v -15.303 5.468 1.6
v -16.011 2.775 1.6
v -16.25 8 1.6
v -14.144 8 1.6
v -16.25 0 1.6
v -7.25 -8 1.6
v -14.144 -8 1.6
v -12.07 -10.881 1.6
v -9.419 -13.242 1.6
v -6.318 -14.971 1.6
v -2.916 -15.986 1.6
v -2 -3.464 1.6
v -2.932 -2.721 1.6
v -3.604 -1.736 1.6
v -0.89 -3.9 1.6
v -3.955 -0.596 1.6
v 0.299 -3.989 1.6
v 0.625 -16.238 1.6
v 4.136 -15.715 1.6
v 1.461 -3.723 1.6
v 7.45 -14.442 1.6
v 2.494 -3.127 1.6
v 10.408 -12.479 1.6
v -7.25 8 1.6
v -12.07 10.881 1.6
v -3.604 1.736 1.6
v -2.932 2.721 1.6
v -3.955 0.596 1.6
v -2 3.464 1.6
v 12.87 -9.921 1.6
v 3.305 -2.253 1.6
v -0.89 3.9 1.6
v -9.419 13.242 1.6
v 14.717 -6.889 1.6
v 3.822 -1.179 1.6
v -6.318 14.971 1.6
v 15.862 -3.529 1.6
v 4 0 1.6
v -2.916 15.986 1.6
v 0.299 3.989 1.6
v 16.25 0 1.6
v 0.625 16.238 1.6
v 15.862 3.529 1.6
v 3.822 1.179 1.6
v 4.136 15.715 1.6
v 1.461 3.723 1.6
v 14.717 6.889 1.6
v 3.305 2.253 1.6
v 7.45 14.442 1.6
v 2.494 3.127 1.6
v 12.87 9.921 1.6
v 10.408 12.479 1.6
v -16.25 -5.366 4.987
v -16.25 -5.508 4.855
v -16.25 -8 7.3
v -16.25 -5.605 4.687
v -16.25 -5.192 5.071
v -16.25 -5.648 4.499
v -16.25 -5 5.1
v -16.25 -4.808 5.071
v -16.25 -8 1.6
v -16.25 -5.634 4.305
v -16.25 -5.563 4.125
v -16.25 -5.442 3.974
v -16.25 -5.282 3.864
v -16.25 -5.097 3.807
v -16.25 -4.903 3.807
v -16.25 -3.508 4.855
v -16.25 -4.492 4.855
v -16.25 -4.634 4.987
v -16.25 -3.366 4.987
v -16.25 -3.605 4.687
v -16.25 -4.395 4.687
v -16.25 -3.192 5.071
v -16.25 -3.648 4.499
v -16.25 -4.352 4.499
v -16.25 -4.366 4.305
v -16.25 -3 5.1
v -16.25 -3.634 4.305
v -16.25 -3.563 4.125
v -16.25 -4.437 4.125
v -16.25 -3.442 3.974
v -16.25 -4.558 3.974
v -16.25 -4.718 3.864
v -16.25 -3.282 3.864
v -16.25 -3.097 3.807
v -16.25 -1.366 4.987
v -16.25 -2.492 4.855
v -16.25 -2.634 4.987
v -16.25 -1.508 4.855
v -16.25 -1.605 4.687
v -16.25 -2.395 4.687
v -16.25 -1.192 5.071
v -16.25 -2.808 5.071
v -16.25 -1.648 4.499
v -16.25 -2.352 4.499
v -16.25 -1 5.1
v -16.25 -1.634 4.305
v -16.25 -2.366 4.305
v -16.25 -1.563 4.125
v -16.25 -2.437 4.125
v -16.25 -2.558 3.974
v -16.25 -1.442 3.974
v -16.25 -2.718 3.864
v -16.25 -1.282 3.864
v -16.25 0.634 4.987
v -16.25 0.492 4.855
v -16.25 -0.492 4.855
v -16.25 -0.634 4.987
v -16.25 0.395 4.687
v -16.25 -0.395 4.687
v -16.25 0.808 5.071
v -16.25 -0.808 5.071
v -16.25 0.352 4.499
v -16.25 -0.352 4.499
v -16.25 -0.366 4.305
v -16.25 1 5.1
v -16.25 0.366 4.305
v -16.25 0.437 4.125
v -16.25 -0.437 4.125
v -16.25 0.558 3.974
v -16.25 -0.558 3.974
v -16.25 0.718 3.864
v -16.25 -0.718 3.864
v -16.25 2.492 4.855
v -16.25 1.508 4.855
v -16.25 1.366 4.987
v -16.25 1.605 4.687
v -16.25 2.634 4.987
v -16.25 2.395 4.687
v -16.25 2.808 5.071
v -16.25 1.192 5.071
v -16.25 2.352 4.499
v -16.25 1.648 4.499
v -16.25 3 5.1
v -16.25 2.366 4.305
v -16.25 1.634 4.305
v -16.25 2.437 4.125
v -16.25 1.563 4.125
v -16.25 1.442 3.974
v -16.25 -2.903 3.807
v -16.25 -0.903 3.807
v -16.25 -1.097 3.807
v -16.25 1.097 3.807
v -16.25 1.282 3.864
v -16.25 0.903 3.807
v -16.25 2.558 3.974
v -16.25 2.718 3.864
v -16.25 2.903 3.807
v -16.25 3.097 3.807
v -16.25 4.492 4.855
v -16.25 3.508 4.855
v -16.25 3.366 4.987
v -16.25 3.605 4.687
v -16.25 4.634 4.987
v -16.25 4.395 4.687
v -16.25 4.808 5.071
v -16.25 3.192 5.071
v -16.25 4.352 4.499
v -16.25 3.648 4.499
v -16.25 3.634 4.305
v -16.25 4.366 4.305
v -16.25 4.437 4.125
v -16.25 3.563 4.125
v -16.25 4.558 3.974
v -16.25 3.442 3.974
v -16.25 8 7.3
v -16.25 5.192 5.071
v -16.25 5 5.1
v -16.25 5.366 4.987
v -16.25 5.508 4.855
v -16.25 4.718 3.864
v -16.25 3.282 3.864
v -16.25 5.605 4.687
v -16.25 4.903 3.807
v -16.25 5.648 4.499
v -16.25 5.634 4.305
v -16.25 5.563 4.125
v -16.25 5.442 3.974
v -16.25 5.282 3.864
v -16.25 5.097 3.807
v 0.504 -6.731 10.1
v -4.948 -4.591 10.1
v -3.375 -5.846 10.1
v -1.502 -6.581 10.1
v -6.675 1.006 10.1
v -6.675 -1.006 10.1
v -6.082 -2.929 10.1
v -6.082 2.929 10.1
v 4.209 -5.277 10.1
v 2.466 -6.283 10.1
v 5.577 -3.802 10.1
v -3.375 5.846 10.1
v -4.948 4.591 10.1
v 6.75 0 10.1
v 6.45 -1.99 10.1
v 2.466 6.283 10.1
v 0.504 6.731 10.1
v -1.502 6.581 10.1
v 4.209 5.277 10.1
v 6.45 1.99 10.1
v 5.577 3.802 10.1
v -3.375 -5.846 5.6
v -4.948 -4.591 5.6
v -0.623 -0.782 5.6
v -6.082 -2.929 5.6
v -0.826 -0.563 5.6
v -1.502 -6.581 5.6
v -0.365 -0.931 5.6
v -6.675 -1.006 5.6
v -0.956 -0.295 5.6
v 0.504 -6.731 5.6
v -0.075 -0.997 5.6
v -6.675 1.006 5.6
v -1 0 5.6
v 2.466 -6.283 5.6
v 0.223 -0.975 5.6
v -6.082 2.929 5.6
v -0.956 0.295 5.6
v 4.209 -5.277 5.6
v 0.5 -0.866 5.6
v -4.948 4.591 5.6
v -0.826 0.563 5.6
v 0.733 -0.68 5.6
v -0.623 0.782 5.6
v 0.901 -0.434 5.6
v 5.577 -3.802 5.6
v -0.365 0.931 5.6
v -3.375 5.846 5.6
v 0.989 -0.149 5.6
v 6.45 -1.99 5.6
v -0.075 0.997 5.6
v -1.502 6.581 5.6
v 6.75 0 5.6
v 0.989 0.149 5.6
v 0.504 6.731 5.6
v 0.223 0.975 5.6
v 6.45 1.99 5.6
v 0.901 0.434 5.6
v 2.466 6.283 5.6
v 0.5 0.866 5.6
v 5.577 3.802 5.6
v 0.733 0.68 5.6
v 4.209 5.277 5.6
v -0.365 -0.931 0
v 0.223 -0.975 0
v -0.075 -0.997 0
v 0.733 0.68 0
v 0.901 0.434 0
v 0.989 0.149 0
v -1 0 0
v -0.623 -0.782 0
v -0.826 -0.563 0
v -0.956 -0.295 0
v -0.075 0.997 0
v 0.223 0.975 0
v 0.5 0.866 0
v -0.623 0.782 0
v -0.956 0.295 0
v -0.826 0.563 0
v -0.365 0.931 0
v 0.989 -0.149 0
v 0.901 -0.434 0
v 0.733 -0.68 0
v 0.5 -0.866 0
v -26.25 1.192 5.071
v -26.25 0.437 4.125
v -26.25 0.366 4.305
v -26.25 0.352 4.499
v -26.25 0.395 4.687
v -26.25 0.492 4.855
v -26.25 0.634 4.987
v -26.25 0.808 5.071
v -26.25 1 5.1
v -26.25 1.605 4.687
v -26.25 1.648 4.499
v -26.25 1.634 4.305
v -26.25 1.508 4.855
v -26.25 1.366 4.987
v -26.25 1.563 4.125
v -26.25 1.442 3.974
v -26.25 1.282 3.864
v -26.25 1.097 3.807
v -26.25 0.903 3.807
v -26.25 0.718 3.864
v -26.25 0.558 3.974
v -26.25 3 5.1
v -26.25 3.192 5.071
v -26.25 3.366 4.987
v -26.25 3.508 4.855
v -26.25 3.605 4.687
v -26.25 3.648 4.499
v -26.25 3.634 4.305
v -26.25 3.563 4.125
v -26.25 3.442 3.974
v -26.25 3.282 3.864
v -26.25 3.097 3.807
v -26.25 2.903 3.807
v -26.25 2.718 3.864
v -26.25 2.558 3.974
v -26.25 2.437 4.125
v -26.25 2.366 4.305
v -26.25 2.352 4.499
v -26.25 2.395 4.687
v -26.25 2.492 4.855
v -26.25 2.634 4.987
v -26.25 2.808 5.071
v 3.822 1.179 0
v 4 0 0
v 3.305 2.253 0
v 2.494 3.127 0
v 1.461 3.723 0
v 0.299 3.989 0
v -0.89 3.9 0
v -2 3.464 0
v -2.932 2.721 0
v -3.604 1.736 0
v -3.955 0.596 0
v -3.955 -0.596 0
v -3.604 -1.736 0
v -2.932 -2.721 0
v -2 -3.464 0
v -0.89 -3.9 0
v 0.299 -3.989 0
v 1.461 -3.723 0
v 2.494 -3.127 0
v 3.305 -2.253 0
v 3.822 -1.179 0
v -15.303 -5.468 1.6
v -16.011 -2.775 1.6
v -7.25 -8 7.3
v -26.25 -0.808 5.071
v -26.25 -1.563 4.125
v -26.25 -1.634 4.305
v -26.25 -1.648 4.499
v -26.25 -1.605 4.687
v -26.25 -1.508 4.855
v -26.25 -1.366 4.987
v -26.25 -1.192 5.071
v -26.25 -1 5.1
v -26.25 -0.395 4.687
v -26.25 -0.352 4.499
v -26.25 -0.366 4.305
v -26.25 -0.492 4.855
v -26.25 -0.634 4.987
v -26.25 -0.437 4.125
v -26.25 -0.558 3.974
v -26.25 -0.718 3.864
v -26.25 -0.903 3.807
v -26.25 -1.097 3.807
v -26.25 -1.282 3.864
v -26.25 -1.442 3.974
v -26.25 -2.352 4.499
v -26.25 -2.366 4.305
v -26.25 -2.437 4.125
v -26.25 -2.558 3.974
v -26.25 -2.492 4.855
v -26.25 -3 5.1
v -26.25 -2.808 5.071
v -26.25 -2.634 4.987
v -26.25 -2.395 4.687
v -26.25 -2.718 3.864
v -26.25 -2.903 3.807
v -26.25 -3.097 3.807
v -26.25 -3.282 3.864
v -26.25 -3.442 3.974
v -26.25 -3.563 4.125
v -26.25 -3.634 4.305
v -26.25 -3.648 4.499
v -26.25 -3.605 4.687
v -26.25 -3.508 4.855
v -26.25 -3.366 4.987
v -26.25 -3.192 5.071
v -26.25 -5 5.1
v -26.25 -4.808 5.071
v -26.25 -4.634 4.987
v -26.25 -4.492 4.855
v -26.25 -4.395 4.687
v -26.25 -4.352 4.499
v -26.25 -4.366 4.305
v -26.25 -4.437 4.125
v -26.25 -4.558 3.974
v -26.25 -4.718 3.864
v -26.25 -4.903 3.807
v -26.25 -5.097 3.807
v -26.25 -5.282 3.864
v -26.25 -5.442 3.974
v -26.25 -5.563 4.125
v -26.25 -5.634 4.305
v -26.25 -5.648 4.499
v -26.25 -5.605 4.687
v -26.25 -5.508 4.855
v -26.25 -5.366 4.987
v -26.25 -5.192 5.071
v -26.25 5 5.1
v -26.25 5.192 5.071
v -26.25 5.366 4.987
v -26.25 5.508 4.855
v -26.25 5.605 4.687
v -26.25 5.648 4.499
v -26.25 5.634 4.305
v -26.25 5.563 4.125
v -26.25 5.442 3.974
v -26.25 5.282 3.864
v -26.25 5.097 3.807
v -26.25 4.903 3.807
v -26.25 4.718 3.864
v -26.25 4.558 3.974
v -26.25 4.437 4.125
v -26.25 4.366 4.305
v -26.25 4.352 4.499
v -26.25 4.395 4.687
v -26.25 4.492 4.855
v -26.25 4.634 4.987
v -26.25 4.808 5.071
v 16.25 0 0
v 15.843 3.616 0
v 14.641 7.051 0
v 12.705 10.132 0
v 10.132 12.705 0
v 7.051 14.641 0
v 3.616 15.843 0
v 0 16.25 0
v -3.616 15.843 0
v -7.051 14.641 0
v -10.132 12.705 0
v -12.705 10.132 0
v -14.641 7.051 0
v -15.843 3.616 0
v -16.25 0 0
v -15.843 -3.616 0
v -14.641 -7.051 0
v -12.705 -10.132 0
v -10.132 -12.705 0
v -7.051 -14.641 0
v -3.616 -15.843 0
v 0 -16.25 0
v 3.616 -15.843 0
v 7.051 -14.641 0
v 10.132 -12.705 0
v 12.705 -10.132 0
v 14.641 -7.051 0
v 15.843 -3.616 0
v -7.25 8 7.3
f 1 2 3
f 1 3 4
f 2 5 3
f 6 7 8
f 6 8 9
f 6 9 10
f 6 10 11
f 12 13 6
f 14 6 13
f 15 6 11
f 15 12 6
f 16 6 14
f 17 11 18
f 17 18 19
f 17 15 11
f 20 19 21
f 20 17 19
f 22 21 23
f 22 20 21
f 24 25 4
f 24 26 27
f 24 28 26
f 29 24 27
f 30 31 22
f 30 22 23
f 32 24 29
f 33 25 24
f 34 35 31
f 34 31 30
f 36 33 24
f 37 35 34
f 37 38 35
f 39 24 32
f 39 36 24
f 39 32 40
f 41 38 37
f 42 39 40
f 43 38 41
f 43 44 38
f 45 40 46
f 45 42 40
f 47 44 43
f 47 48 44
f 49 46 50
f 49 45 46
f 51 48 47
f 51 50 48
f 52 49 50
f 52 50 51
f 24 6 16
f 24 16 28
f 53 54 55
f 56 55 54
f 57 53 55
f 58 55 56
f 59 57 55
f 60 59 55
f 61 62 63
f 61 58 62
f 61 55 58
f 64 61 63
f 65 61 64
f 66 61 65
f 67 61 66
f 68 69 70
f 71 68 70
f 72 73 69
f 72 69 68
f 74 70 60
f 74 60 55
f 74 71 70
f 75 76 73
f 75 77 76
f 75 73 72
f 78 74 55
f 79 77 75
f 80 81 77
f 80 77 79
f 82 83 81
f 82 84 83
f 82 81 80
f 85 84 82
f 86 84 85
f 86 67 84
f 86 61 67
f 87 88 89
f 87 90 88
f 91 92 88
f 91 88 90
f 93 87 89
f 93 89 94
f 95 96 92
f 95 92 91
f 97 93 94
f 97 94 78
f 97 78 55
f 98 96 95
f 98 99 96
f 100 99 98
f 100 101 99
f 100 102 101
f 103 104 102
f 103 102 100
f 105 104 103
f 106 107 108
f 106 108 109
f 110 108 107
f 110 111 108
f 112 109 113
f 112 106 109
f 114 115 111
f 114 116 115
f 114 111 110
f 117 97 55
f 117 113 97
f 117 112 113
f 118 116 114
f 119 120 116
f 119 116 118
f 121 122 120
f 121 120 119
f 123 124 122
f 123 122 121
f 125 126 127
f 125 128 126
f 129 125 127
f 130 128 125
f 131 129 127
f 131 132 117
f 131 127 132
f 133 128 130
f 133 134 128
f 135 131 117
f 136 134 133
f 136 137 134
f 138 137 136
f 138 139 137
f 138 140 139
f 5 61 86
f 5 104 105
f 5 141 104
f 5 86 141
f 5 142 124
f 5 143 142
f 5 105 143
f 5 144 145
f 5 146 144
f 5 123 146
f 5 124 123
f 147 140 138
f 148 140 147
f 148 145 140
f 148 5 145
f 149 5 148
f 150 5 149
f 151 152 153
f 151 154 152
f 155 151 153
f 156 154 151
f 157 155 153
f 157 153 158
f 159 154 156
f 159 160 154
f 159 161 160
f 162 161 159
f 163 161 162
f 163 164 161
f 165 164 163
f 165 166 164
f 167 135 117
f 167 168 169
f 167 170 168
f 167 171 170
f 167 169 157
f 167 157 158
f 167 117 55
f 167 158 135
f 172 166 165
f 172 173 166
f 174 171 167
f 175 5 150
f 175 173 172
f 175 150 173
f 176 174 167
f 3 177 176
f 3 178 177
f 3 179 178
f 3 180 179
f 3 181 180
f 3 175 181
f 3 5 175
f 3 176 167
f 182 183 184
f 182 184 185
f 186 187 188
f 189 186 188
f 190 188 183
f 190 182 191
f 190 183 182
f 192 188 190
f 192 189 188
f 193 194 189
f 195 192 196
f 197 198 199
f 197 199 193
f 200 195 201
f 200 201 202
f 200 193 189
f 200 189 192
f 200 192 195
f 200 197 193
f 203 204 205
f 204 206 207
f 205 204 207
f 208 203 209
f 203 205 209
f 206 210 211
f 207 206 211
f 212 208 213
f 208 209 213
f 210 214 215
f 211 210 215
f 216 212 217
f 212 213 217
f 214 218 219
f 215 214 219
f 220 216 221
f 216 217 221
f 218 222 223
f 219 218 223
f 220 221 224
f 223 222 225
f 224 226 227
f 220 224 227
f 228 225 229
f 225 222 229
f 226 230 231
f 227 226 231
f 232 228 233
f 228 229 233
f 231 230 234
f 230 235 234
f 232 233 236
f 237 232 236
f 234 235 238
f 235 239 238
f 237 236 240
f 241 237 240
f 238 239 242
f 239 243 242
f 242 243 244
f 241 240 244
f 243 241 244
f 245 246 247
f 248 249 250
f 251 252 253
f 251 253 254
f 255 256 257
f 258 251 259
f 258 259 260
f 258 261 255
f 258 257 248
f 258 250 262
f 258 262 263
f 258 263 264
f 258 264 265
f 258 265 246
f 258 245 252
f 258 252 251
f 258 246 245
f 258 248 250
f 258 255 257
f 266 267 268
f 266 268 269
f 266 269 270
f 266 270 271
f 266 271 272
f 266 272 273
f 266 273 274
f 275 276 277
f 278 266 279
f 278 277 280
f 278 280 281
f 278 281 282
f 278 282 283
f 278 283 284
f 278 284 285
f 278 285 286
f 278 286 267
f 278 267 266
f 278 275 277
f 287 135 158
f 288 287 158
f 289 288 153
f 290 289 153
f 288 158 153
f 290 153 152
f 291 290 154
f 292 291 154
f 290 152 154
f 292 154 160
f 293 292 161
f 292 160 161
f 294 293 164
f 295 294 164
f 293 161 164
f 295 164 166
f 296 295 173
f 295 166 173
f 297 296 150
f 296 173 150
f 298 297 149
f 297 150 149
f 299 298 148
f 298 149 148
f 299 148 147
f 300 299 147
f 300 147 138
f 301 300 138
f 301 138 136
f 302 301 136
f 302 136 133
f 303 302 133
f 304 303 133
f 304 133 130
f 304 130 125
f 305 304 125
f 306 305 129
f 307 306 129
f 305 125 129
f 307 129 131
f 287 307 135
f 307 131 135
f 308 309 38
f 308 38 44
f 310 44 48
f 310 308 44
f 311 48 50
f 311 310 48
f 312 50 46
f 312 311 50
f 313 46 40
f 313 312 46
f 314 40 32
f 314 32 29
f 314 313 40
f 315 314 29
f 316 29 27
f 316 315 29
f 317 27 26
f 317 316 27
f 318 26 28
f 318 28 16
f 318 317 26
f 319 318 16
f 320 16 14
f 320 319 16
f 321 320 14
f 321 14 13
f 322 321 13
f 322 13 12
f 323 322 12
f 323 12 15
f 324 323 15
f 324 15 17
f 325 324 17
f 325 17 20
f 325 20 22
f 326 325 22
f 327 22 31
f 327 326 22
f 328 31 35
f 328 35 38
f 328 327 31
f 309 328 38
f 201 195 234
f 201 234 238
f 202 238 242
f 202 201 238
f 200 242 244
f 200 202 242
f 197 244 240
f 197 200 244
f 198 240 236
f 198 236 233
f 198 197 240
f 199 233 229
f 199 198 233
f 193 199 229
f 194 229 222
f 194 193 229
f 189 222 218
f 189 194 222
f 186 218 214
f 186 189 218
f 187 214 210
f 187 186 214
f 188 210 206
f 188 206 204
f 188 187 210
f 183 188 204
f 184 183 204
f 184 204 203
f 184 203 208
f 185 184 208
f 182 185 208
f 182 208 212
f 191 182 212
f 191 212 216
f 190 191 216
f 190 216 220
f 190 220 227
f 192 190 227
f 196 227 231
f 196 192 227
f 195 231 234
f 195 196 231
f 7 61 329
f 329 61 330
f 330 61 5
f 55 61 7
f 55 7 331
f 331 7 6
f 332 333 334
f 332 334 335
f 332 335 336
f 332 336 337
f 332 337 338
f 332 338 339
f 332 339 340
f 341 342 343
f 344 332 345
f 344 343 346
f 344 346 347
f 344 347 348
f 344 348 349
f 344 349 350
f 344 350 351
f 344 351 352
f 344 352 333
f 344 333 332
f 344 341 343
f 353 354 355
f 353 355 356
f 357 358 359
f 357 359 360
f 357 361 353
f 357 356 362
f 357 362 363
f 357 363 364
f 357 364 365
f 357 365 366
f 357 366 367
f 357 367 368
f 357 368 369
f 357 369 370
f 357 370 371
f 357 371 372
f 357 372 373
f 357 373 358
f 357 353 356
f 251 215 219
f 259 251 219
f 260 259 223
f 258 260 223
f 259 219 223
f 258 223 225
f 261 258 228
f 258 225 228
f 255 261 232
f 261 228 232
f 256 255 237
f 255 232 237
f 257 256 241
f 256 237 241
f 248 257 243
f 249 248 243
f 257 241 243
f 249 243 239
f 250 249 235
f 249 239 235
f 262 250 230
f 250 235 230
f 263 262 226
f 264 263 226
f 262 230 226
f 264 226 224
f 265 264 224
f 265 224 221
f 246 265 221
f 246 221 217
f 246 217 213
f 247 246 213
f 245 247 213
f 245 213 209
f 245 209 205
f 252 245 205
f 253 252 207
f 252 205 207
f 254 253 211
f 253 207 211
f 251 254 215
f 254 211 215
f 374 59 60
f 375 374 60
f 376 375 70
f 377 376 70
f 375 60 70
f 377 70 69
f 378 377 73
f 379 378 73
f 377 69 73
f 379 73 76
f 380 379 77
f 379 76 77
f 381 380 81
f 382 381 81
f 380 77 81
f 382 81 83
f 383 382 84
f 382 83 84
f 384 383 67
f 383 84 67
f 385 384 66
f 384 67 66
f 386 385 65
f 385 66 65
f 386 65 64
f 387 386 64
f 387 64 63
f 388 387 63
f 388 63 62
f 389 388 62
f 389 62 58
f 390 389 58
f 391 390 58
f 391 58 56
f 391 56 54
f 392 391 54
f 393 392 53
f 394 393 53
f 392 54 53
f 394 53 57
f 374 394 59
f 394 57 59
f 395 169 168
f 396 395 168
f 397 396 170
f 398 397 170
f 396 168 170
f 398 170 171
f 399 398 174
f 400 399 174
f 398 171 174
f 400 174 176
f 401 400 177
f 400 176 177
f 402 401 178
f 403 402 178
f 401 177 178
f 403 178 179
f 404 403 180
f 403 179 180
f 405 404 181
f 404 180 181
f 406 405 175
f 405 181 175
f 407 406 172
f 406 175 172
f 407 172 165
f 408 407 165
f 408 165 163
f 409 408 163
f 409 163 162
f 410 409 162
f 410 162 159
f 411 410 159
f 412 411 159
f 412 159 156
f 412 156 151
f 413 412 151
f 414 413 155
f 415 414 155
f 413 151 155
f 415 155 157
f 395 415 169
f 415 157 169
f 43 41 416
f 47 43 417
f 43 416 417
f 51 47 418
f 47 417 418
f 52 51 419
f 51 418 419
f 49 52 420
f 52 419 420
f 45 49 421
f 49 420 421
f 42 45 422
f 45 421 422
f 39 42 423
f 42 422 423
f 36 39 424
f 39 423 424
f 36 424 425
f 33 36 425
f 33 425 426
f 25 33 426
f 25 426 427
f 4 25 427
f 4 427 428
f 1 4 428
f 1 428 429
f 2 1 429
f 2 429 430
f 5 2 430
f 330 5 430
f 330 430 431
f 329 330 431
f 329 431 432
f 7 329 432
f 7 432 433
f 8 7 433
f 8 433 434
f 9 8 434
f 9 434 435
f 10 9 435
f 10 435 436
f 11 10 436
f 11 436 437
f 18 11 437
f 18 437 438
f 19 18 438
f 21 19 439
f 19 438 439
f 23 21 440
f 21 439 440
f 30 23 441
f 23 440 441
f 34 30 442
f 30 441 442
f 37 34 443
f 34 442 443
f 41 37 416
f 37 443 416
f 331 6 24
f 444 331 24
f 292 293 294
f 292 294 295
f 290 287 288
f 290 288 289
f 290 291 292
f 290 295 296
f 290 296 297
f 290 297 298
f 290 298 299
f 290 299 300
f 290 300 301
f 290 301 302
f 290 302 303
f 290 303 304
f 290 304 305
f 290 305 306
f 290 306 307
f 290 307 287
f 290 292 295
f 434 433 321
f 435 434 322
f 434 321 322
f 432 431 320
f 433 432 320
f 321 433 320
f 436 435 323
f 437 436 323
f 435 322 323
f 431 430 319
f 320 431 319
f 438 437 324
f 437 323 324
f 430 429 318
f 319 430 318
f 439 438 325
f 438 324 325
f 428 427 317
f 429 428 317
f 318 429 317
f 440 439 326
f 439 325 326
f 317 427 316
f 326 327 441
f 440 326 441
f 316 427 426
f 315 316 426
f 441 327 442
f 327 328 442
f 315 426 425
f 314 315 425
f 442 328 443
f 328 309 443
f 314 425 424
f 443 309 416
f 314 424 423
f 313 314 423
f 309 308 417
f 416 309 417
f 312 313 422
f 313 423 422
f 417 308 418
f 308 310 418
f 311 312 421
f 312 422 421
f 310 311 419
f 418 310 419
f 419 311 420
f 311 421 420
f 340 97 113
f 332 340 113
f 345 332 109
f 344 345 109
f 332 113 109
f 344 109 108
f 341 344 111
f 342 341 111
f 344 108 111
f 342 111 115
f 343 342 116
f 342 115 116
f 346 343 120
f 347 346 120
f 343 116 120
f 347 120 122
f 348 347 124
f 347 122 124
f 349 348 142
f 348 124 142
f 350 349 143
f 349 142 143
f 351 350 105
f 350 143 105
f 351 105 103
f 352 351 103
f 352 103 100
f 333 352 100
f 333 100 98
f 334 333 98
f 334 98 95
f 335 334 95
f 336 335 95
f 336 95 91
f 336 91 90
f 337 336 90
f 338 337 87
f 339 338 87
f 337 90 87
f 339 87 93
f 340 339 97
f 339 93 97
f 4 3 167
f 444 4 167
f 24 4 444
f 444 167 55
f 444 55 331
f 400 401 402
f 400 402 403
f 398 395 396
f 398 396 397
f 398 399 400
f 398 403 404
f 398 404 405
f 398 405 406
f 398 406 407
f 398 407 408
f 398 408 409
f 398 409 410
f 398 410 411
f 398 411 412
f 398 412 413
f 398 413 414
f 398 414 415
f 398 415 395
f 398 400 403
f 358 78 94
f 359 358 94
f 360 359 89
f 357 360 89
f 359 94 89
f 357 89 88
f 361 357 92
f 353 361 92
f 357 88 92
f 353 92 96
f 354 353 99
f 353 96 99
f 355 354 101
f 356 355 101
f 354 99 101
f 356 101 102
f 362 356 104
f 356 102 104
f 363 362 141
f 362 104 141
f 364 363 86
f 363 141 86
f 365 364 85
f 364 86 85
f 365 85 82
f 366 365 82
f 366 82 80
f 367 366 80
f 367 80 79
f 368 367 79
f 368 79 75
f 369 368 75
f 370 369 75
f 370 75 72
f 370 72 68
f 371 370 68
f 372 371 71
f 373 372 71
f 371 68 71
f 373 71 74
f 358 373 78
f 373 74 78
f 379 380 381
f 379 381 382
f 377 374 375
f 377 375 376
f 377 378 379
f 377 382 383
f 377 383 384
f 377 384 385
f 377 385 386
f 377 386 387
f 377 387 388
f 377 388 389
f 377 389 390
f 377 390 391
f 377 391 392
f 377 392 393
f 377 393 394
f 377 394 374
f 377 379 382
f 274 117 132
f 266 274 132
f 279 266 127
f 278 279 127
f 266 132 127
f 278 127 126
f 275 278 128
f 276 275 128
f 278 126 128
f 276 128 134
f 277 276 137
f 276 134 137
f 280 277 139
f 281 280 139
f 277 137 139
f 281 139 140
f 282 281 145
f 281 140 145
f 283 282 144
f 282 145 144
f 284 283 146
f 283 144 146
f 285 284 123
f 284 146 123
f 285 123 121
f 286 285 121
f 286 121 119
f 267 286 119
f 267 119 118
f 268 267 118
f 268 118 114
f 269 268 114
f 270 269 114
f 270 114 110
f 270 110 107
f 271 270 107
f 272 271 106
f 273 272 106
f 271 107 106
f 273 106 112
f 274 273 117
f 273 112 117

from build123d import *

# Parameters (mm, degrees)
SKETCH1_R           = 16.25
SKETCH1_R_2         = 4
BOSS_EXTRUDE1_DEPTH = 1.6
SKETCH2_W           = 9
SKETCH2_H           = 16
BOSS_EXTRUDE2_DEPTH = 5.7
SKETCH3_R           = 0.65
BOSS_EXTRUDE3_DEPTH = 10
SKETCH4_R           = 6.75
BOSS_EXTRUDE4_DEPTH = 4.5
SKETCH5_R           = 1
BOSS_EXTRUDE5_DEPTH = 5.6


with BuildPart() as part:
    # Sketch1 → Boss-Extrude1 (new body)
    with BuildSketch(Plane.XY):
        Circle(SKETCH1_R)
        Circle(SKETCH1_R_2, mode=Mode.SUBTRACT)
    extrude(amount=BOSS_EXTRUDE1_DEPTH)

    # Sketch2 → Boss-Extrude2 (add)
    with BuildSketch(Plane.XY.offset(1.6)):
        with Locations((-11.75, 0)):
            Rectangle(SKETCH2_W, SKETCH2_H)
    extrude(amount=BOSS_EXTRUDE2_DEPTH)

    # Sketch3 → Boss-Extrude3 (add)
    with BuildSketch(Plane.ZY.offset(16.25)):
        with Locations((4.45, 5)):
            Circle(SKETCH3_R)
        with Locations((4.45, 3)):
            Circle(SKETCH3_R)
        with Locations((4.45, 1)):
            Circle(SKETCH3_R)
        with Locations((4.45, -1)):
            Circle(SKETCH3_R)
        with Locations((4.45, -3)):
            Circle(SKETCH3_R)
        with Locations((4.45, -5)):
            Circle(SKETCH3_R)
    extrude(amount=BOSS_EXTRUDE3_DEPTH)


with BuildPart() as body_2:
    # Sketch4 → Boss-Extrude4 (new body)
    with BuildSketch(Plane.XY.offset(10.1)):
        Circle(SKETCH4_R)
    extrude(amount=-BOSS_EXTRUDE4_DEPTH)

    # Sketch5 → Boss-Extrude5 (add)
    with BuildSketch(Plane(origin=(0, 0, 5.6), x_dir=(-1, 0, 0), z_dir=(0, 0, -1))):
        Circle(SKETCH5_R)
    extrude(amount=BOSS_EXTRUDE5_DEPTH)


solid = Compound([part.part, body_2.part])
